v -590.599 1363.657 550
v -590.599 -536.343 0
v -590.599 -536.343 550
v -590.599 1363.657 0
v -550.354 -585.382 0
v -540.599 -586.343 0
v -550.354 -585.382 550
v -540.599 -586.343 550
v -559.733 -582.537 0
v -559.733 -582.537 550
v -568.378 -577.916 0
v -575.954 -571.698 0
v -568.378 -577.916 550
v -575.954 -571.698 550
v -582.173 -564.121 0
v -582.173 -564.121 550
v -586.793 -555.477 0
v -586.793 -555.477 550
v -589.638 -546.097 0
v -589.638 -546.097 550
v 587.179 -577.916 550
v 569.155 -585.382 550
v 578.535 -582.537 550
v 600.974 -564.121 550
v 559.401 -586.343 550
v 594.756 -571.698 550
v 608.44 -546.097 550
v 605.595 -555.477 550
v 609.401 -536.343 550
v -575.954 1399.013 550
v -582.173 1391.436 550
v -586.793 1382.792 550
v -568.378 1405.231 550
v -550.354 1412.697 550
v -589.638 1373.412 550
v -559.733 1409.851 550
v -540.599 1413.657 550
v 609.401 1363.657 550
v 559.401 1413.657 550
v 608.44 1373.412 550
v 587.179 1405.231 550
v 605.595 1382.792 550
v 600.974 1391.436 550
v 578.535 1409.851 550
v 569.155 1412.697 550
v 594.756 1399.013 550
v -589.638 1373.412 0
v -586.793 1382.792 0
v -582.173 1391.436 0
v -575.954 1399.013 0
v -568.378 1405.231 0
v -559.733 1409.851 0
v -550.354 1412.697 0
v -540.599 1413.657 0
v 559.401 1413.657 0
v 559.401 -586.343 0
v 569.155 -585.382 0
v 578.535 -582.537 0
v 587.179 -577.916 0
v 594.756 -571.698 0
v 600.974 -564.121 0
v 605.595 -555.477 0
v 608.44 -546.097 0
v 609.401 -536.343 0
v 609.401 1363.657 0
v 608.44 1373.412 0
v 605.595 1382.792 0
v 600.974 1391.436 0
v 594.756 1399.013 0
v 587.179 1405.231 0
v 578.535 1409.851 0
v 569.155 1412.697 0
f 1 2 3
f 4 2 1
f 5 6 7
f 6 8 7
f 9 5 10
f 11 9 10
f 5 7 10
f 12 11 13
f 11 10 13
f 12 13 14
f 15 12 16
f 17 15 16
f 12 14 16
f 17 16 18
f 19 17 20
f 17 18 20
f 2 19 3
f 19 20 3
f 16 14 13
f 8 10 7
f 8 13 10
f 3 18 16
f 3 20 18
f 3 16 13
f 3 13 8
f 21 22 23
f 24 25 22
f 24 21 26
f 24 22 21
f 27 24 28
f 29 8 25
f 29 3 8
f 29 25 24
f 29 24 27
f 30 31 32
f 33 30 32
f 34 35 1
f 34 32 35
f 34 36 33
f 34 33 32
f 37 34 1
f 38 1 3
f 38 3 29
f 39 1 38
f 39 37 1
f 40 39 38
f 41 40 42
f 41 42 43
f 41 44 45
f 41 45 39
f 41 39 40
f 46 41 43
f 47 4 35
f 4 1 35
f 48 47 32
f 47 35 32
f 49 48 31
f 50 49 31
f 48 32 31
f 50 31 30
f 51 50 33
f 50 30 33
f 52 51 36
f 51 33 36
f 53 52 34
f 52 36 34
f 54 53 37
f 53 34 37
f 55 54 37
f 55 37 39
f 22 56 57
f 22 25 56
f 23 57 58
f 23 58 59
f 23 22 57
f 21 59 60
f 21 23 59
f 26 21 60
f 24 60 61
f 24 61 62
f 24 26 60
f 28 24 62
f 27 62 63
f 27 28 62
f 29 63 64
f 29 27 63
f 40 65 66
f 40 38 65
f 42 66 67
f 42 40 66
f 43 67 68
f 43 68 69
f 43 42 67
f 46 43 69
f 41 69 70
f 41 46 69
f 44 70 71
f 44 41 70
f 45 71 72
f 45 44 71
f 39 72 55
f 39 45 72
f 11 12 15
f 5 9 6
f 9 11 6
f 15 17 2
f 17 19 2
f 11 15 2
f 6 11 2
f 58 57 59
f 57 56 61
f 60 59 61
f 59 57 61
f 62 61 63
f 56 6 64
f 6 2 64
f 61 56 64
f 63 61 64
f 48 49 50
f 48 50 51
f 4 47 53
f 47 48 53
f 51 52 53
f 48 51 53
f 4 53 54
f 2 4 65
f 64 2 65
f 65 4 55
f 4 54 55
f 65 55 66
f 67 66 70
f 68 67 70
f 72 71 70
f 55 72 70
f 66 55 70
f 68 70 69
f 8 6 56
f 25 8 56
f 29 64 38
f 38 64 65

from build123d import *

# Parameters (mm, degrees)
F0_W     = 1200
F0_H     = 2000
F1_DEPTH = 550
F2_R     = 50
F3_R     = 50
F4_R     = 50


with BuildPart() as f1:
    # F0 (on Top) → F1 (new body)
    with BuildSketch(Plane.XY):
        with Locations((9.400919, 413.657364)):
            Rectangle(F0_W, F0_H)
    extrude(amount=F1_DEPTH)

    # F2
    f2_edges = [f1.edges().sort_by_distance(p)[0] for p in [
        (609.400919, -586.342636, 275),
    ]]
    fillet(f2_edges, radius=F2_R)

    # F3
    f3_edges = [f1.edges().sort_by_distance(p)[0] for p in [
        (-590.599081, -586.342636, 275),
    ]]
    fillet(f3_edges, radius=F3_R)

    # F4
    f4_edges = [f1.edges().sort_by_distance(p)[0] for p in [
        (609.400919, 1413.657364, 275),
        (-590.599081, 1413.657364, 275),
    ]]
    fillet(f4_edges, radius=F4_R)


solid = f1.part
